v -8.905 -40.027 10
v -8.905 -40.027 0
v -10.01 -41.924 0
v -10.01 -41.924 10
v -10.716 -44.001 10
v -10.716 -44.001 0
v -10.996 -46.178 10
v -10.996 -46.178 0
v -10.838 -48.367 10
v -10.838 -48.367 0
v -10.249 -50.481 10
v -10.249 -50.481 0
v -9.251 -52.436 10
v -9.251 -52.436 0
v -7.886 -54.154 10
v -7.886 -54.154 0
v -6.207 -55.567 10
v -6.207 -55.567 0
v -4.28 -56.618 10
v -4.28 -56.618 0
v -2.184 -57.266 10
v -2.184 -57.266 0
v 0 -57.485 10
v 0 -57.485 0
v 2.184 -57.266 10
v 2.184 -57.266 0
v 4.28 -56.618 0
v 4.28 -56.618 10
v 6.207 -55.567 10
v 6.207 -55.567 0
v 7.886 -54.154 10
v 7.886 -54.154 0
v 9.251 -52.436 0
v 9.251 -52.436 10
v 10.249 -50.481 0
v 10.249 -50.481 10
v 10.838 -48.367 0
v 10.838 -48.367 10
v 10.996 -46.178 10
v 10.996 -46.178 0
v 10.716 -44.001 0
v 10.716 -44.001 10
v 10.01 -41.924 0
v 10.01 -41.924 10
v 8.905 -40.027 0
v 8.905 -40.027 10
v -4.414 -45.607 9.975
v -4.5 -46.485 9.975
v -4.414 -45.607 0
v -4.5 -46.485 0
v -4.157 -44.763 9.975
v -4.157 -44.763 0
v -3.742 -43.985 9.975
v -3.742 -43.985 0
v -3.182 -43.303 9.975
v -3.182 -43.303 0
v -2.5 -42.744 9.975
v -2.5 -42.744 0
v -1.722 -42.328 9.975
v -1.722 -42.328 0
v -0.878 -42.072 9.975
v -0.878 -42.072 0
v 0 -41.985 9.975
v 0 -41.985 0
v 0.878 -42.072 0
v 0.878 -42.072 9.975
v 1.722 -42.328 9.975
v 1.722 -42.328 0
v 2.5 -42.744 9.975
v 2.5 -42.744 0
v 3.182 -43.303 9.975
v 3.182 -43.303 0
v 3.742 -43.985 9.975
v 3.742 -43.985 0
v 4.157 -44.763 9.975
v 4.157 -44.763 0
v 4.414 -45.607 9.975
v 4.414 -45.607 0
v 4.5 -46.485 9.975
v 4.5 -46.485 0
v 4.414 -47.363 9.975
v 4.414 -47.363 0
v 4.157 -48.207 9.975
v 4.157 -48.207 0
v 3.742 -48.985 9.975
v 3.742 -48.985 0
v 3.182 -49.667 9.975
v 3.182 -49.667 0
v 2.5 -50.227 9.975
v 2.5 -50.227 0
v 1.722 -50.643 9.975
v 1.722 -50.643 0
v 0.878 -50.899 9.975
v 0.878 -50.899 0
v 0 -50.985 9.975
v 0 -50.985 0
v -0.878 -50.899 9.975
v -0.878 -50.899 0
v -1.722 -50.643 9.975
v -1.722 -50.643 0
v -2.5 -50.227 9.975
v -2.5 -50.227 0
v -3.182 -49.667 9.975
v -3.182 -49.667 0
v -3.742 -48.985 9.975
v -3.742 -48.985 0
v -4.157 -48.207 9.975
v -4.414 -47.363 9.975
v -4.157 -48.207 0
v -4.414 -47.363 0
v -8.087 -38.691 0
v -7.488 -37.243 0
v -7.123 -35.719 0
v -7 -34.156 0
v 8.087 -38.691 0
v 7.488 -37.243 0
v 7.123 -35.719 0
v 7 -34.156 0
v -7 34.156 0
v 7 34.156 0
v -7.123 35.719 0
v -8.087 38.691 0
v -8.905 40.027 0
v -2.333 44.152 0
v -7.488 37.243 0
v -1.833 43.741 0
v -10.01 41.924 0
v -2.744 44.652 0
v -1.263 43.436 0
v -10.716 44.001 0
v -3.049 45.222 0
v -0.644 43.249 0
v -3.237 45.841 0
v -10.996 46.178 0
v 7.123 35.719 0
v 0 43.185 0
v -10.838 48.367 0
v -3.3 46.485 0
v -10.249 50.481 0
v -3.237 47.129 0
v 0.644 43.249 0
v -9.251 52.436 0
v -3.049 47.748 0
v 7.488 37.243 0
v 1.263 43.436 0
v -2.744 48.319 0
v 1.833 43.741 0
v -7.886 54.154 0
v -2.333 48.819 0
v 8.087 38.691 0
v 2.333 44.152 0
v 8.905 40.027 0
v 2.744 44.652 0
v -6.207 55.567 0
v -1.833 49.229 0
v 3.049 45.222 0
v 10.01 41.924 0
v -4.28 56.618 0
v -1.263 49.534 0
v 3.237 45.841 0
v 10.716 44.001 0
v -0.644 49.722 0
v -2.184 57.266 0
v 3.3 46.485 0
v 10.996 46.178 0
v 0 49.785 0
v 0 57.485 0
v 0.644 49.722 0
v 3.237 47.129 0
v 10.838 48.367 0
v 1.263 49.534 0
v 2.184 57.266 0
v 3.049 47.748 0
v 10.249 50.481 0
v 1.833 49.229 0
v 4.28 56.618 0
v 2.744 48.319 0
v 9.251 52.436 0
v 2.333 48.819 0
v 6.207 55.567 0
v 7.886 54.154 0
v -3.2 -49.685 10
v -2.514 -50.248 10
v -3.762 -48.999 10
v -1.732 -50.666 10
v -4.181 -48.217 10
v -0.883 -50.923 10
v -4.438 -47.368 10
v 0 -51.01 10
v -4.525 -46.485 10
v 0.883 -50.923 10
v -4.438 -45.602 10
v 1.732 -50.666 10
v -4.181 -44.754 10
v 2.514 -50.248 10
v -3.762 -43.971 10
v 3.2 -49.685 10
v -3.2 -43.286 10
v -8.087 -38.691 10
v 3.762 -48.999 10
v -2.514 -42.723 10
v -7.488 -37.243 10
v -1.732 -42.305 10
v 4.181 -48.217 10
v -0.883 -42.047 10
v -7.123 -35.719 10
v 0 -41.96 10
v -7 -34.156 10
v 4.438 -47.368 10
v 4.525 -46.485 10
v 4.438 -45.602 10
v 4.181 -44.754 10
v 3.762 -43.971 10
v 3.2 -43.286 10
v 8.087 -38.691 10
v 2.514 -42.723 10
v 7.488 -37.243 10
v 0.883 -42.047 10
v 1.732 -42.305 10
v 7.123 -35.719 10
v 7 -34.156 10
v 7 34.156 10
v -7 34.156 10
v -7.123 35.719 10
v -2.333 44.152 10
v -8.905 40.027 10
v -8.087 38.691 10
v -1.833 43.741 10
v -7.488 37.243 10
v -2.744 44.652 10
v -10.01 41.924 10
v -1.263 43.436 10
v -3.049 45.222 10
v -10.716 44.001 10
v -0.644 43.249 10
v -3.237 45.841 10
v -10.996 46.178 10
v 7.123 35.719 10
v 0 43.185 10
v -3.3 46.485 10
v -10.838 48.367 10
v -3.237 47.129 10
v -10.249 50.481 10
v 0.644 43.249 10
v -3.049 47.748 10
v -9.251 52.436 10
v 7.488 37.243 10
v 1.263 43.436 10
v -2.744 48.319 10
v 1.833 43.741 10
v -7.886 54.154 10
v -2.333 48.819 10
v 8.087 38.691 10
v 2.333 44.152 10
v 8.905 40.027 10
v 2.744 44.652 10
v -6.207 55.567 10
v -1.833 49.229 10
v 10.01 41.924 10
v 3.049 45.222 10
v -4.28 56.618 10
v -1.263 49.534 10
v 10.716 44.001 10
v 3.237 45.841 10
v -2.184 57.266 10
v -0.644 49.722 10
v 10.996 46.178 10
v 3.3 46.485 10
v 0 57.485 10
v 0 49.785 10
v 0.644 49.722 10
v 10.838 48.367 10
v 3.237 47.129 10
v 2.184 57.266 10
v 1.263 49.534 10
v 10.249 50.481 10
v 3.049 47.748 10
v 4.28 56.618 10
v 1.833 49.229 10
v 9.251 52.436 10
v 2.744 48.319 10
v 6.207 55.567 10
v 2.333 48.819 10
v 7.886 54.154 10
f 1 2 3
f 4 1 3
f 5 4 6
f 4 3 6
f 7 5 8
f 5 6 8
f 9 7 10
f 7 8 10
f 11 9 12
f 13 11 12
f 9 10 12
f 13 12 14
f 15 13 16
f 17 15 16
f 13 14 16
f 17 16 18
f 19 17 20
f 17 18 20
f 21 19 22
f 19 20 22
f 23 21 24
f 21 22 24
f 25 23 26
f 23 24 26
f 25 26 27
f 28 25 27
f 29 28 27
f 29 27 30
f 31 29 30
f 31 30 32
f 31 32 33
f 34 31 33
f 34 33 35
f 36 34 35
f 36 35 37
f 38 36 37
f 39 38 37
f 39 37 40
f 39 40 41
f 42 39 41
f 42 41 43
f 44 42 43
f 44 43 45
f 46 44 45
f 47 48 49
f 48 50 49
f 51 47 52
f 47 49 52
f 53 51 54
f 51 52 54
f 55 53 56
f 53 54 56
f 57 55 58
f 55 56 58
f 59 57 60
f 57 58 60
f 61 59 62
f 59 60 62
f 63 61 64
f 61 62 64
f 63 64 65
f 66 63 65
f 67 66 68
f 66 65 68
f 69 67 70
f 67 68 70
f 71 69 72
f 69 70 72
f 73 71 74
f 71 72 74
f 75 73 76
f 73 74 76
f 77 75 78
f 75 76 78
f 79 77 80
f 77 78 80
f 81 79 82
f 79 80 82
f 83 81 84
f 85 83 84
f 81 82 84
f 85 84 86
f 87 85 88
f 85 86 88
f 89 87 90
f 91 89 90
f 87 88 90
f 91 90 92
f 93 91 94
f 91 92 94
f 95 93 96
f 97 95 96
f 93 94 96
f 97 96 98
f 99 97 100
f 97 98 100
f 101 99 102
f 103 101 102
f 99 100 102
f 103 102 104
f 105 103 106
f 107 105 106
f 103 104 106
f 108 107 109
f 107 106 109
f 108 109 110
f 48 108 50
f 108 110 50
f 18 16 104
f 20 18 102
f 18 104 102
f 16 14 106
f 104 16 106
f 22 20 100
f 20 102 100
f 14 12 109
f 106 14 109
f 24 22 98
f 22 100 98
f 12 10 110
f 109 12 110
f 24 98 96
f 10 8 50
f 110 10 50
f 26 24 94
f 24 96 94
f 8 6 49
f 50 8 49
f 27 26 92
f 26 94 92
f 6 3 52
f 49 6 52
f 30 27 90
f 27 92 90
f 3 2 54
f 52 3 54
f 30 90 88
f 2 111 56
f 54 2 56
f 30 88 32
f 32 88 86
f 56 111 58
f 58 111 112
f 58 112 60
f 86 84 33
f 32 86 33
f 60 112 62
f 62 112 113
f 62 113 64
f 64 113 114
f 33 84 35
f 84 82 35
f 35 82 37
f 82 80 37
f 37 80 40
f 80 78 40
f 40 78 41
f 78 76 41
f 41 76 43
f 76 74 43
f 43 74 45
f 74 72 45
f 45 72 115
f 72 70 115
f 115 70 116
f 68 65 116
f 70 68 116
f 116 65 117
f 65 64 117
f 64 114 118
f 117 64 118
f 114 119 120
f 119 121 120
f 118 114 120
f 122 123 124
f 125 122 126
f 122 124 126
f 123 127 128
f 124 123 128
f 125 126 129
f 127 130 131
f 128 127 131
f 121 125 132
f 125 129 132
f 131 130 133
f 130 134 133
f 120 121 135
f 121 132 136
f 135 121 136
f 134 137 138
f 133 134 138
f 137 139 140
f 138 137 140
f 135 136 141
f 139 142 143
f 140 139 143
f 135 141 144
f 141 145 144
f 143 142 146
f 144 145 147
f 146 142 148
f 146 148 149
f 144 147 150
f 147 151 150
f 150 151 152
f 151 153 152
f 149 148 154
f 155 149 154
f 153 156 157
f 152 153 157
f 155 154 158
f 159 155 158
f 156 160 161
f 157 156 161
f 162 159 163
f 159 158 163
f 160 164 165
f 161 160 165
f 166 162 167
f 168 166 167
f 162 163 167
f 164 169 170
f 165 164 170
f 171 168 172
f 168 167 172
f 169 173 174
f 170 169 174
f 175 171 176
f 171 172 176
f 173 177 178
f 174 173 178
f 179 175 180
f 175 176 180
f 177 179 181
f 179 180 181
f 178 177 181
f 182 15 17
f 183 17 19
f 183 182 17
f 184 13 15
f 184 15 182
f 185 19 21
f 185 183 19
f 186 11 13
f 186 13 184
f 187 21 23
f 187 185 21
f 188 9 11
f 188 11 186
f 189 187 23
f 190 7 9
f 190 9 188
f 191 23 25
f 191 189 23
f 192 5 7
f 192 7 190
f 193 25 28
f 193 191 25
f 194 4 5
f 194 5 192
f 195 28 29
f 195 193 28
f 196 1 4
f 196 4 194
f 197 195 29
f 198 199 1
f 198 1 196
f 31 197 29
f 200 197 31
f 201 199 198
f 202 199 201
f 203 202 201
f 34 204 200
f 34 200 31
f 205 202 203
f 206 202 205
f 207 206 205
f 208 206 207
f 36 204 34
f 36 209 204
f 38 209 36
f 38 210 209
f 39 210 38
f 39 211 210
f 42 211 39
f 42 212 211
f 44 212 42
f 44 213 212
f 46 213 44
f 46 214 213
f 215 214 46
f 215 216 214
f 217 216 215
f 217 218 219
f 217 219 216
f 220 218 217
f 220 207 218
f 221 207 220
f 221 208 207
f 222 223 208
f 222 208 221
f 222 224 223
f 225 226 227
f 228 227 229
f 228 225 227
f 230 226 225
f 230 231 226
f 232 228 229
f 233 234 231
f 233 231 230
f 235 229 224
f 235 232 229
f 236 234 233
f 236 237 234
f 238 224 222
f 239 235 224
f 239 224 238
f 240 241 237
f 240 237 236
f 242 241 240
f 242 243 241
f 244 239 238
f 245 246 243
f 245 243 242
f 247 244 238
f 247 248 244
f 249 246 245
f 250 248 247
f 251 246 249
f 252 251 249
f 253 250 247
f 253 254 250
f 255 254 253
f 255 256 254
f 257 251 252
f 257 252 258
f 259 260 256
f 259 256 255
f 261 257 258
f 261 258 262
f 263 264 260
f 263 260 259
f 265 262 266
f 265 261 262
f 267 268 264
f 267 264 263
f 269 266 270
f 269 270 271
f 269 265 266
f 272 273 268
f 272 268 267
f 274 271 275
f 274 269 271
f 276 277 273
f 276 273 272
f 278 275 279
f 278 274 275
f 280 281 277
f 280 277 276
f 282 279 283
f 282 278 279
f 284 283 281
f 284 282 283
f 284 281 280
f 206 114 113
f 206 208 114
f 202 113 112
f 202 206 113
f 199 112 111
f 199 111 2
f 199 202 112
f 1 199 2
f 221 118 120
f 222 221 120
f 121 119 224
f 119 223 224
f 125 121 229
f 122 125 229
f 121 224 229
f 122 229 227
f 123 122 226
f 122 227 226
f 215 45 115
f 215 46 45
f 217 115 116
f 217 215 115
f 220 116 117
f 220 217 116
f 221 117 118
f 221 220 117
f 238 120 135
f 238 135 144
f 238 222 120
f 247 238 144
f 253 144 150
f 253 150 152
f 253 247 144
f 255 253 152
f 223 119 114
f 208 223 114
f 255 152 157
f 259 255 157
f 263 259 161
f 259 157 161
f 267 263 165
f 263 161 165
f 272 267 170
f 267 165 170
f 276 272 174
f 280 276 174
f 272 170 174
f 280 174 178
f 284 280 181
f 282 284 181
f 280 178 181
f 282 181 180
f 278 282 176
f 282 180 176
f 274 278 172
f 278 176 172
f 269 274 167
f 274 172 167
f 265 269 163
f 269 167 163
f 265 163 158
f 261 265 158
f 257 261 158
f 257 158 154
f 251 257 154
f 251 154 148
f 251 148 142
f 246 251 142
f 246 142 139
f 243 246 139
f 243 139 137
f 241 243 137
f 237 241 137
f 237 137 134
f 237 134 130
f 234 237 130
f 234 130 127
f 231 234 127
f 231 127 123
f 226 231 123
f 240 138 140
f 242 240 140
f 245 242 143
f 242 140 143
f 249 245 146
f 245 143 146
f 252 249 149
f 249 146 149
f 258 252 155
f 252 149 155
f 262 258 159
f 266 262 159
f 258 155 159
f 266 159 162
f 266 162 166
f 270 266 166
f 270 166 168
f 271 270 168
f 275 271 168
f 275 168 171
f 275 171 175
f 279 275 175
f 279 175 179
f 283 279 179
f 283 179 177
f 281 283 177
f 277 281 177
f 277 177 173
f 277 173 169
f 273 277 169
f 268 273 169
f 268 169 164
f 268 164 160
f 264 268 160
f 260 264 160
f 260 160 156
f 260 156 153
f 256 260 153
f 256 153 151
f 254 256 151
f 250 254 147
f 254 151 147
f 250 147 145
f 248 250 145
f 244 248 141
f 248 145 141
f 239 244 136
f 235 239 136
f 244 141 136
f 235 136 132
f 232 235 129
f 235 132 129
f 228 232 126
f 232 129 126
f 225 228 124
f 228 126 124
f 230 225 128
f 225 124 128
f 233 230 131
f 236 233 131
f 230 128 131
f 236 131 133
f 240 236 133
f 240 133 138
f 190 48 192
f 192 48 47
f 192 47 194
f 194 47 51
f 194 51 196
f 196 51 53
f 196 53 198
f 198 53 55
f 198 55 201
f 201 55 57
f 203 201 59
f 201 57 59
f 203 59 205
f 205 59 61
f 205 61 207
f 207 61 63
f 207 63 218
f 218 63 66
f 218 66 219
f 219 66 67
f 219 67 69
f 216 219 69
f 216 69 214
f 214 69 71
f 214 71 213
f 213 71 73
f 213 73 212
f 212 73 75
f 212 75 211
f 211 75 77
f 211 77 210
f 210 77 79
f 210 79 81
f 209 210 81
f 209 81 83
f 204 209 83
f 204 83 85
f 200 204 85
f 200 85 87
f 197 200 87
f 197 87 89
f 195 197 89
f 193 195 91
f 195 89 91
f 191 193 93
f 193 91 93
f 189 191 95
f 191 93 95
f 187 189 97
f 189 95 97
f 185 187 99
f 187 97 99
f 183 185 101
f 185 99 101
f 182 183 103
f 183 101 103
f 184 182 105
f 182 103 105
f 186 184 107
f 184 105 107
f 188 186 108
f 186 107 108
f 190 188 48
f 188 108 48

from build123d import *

# Parameters (mm, degrees)
BOSS_EXTRU_2_DEPTH         = 10
CONG_1_R                   = 10
D_GAGEMENT_M81_D           = 9
D_GAGEMENT_M81_CSINK_D     = 9.05
D_GAGEMENT_M81_CSINK_ANGLE = 90
D_GAGEMENT_M61_D           = 6.6


with BuildPart() as part:
    # Esquisse1 → Boss.-Extru.2 (new body)
    with BuildSketch(Plane.XY):
        with BuildLine():
            Line((-7, 38), (-7, -38))
            ThreePointArc((-7, -38), (0, -57.485281374), (7, -38))
            Line((7, -38), (7, 38))
            ThreePointArc((7, 38), (0, 57.485281374), (-7, 38))
        make_face()
    extrude(amount=BOSS_EXTRU_2_DEPTH)

    # Congé1
    cong_1_edges = [part.edges().sort_by_distance(p)[0] for p in [
        (7, 38, 5),
        (7, -38, 5),
        (-7, -38, 5),
        (-7, 38, 5),
    ]]
    fillet(cong_1_edges, radius=CONG_1_R)

    # Dégagement M81 (through all)
    with Locations(Plane.XY.offset(10)):
        with Locations((0, -46.485281374)):
            CounterSinkHole(D_GAGEMENT_M81_D / 2, D_GAGEMENT_M81_CSINK_D / 2, counter_sink_angle=D_GAGEMENT_M81_CSINK_ANGLE)

    # Dégagement M61 (through all)
    with Locations(Plane.XY.offset(10)):
        with Locations((0, 46.485281374)):
            Hole(D_GAGEMENT_M61_D / 2)


solid = part.part
